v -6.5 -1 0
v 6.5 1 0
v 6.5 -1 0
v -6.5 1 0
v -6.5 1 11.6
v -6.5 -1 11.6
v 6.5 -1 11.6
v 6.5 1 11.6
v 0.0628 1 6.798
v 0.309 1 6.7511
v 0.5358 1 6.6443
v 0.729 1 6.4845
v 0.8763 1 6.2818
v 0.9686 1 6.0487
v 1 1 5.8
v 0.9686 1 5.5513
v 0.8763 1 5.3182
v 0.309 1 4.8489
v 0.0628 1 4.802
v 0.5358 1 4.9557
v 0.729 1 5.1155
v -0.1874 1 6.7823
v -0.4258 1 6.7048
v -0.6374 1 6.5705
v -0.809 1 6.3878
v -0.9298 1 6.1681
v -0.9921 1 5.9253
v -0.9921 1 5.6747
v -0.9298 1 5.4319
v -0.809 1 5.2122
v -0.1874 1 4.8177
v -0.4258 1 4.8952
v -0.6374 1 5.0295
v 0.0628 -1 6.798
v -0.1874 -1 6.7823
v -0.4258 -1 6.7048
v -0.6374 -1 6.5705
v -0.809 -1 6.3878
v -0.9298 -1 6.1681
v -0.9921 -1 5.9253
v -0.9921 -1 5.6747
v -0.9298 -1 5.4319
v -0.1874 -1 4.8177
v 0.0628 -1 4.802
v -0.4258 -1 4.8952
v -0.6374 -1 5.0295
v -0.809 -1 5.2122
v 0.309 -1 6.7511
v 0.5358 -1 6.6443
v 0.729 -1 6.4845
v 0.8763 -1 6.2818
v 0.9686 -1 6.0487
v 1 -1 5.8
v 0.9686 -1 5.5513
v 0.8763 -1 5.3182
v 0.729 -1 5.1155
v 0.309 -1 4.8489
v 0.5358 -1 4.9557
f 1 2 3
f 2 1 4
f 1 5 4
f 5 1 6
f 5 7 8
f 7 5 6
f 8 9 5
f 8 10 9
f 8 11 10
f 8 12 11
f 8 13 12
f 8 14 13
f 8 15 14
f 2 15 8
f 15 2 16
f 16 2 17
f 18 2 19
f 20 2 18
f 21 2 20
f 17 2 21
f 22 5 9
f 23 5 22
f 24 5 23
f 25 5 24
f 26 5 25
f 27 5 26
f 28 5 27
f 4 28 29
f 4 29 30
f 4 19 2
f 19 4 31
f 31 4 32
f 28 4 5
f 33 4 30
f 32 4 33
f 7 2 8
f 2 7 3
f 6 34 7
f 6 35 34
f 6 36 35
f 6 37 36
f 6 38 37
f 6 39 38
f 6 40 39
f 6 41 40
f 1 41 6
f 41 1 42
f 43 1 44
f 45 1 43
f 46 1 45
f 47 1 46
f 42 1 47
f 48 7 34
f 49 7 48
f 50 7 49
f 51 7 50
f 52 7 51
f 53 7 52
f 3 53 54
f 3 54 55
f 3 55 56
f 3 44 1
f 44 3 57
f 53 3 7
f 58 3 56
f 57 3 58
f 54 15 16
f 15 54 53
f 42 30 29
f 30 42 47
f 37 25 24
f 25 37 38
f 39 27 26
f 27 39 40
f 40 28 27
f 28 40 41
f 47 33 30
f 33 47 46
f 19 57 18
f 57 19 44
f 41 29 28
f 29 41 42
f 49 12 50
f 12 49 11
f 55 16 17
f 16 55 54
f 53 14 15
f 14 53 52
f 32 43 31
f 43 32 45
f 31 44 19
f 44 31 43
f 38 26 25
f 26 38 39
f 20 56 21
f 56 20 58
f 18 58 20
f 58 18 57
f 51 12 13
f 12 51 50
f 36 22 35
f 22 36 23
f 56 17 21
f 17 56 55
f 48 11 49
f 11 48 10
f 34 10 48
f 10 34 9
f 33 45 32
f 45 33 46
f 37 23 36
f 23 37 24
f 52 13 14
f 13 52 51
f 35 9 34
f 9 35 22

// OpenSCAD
fin_size = [
    13,
    2,
    11.6
];

mount_hole_size = [
    2,
    7
];

mount_hole_rotate = [
    90,
    0,
    0
];

mount_hole_pos = [
    0,
    0,
    fin_size.z/2
];


module block(size) {
    linear_extrude(height=size.z)
    square([size.x, size.y], center=true);
};

module clinch(size) {
    $fn = 25;
    translate(
        [
            0,
            0,
            -size.y/2
        ]
    )
    linear_extrude(height=size.y)
    circle(size.x/2, center=true);
};

difference() {
    block(fin_size);
    
    translate(mount_hole_pos)
    rotate(mount_hole_rotate)
    clinch(mount_hole_size);
};
